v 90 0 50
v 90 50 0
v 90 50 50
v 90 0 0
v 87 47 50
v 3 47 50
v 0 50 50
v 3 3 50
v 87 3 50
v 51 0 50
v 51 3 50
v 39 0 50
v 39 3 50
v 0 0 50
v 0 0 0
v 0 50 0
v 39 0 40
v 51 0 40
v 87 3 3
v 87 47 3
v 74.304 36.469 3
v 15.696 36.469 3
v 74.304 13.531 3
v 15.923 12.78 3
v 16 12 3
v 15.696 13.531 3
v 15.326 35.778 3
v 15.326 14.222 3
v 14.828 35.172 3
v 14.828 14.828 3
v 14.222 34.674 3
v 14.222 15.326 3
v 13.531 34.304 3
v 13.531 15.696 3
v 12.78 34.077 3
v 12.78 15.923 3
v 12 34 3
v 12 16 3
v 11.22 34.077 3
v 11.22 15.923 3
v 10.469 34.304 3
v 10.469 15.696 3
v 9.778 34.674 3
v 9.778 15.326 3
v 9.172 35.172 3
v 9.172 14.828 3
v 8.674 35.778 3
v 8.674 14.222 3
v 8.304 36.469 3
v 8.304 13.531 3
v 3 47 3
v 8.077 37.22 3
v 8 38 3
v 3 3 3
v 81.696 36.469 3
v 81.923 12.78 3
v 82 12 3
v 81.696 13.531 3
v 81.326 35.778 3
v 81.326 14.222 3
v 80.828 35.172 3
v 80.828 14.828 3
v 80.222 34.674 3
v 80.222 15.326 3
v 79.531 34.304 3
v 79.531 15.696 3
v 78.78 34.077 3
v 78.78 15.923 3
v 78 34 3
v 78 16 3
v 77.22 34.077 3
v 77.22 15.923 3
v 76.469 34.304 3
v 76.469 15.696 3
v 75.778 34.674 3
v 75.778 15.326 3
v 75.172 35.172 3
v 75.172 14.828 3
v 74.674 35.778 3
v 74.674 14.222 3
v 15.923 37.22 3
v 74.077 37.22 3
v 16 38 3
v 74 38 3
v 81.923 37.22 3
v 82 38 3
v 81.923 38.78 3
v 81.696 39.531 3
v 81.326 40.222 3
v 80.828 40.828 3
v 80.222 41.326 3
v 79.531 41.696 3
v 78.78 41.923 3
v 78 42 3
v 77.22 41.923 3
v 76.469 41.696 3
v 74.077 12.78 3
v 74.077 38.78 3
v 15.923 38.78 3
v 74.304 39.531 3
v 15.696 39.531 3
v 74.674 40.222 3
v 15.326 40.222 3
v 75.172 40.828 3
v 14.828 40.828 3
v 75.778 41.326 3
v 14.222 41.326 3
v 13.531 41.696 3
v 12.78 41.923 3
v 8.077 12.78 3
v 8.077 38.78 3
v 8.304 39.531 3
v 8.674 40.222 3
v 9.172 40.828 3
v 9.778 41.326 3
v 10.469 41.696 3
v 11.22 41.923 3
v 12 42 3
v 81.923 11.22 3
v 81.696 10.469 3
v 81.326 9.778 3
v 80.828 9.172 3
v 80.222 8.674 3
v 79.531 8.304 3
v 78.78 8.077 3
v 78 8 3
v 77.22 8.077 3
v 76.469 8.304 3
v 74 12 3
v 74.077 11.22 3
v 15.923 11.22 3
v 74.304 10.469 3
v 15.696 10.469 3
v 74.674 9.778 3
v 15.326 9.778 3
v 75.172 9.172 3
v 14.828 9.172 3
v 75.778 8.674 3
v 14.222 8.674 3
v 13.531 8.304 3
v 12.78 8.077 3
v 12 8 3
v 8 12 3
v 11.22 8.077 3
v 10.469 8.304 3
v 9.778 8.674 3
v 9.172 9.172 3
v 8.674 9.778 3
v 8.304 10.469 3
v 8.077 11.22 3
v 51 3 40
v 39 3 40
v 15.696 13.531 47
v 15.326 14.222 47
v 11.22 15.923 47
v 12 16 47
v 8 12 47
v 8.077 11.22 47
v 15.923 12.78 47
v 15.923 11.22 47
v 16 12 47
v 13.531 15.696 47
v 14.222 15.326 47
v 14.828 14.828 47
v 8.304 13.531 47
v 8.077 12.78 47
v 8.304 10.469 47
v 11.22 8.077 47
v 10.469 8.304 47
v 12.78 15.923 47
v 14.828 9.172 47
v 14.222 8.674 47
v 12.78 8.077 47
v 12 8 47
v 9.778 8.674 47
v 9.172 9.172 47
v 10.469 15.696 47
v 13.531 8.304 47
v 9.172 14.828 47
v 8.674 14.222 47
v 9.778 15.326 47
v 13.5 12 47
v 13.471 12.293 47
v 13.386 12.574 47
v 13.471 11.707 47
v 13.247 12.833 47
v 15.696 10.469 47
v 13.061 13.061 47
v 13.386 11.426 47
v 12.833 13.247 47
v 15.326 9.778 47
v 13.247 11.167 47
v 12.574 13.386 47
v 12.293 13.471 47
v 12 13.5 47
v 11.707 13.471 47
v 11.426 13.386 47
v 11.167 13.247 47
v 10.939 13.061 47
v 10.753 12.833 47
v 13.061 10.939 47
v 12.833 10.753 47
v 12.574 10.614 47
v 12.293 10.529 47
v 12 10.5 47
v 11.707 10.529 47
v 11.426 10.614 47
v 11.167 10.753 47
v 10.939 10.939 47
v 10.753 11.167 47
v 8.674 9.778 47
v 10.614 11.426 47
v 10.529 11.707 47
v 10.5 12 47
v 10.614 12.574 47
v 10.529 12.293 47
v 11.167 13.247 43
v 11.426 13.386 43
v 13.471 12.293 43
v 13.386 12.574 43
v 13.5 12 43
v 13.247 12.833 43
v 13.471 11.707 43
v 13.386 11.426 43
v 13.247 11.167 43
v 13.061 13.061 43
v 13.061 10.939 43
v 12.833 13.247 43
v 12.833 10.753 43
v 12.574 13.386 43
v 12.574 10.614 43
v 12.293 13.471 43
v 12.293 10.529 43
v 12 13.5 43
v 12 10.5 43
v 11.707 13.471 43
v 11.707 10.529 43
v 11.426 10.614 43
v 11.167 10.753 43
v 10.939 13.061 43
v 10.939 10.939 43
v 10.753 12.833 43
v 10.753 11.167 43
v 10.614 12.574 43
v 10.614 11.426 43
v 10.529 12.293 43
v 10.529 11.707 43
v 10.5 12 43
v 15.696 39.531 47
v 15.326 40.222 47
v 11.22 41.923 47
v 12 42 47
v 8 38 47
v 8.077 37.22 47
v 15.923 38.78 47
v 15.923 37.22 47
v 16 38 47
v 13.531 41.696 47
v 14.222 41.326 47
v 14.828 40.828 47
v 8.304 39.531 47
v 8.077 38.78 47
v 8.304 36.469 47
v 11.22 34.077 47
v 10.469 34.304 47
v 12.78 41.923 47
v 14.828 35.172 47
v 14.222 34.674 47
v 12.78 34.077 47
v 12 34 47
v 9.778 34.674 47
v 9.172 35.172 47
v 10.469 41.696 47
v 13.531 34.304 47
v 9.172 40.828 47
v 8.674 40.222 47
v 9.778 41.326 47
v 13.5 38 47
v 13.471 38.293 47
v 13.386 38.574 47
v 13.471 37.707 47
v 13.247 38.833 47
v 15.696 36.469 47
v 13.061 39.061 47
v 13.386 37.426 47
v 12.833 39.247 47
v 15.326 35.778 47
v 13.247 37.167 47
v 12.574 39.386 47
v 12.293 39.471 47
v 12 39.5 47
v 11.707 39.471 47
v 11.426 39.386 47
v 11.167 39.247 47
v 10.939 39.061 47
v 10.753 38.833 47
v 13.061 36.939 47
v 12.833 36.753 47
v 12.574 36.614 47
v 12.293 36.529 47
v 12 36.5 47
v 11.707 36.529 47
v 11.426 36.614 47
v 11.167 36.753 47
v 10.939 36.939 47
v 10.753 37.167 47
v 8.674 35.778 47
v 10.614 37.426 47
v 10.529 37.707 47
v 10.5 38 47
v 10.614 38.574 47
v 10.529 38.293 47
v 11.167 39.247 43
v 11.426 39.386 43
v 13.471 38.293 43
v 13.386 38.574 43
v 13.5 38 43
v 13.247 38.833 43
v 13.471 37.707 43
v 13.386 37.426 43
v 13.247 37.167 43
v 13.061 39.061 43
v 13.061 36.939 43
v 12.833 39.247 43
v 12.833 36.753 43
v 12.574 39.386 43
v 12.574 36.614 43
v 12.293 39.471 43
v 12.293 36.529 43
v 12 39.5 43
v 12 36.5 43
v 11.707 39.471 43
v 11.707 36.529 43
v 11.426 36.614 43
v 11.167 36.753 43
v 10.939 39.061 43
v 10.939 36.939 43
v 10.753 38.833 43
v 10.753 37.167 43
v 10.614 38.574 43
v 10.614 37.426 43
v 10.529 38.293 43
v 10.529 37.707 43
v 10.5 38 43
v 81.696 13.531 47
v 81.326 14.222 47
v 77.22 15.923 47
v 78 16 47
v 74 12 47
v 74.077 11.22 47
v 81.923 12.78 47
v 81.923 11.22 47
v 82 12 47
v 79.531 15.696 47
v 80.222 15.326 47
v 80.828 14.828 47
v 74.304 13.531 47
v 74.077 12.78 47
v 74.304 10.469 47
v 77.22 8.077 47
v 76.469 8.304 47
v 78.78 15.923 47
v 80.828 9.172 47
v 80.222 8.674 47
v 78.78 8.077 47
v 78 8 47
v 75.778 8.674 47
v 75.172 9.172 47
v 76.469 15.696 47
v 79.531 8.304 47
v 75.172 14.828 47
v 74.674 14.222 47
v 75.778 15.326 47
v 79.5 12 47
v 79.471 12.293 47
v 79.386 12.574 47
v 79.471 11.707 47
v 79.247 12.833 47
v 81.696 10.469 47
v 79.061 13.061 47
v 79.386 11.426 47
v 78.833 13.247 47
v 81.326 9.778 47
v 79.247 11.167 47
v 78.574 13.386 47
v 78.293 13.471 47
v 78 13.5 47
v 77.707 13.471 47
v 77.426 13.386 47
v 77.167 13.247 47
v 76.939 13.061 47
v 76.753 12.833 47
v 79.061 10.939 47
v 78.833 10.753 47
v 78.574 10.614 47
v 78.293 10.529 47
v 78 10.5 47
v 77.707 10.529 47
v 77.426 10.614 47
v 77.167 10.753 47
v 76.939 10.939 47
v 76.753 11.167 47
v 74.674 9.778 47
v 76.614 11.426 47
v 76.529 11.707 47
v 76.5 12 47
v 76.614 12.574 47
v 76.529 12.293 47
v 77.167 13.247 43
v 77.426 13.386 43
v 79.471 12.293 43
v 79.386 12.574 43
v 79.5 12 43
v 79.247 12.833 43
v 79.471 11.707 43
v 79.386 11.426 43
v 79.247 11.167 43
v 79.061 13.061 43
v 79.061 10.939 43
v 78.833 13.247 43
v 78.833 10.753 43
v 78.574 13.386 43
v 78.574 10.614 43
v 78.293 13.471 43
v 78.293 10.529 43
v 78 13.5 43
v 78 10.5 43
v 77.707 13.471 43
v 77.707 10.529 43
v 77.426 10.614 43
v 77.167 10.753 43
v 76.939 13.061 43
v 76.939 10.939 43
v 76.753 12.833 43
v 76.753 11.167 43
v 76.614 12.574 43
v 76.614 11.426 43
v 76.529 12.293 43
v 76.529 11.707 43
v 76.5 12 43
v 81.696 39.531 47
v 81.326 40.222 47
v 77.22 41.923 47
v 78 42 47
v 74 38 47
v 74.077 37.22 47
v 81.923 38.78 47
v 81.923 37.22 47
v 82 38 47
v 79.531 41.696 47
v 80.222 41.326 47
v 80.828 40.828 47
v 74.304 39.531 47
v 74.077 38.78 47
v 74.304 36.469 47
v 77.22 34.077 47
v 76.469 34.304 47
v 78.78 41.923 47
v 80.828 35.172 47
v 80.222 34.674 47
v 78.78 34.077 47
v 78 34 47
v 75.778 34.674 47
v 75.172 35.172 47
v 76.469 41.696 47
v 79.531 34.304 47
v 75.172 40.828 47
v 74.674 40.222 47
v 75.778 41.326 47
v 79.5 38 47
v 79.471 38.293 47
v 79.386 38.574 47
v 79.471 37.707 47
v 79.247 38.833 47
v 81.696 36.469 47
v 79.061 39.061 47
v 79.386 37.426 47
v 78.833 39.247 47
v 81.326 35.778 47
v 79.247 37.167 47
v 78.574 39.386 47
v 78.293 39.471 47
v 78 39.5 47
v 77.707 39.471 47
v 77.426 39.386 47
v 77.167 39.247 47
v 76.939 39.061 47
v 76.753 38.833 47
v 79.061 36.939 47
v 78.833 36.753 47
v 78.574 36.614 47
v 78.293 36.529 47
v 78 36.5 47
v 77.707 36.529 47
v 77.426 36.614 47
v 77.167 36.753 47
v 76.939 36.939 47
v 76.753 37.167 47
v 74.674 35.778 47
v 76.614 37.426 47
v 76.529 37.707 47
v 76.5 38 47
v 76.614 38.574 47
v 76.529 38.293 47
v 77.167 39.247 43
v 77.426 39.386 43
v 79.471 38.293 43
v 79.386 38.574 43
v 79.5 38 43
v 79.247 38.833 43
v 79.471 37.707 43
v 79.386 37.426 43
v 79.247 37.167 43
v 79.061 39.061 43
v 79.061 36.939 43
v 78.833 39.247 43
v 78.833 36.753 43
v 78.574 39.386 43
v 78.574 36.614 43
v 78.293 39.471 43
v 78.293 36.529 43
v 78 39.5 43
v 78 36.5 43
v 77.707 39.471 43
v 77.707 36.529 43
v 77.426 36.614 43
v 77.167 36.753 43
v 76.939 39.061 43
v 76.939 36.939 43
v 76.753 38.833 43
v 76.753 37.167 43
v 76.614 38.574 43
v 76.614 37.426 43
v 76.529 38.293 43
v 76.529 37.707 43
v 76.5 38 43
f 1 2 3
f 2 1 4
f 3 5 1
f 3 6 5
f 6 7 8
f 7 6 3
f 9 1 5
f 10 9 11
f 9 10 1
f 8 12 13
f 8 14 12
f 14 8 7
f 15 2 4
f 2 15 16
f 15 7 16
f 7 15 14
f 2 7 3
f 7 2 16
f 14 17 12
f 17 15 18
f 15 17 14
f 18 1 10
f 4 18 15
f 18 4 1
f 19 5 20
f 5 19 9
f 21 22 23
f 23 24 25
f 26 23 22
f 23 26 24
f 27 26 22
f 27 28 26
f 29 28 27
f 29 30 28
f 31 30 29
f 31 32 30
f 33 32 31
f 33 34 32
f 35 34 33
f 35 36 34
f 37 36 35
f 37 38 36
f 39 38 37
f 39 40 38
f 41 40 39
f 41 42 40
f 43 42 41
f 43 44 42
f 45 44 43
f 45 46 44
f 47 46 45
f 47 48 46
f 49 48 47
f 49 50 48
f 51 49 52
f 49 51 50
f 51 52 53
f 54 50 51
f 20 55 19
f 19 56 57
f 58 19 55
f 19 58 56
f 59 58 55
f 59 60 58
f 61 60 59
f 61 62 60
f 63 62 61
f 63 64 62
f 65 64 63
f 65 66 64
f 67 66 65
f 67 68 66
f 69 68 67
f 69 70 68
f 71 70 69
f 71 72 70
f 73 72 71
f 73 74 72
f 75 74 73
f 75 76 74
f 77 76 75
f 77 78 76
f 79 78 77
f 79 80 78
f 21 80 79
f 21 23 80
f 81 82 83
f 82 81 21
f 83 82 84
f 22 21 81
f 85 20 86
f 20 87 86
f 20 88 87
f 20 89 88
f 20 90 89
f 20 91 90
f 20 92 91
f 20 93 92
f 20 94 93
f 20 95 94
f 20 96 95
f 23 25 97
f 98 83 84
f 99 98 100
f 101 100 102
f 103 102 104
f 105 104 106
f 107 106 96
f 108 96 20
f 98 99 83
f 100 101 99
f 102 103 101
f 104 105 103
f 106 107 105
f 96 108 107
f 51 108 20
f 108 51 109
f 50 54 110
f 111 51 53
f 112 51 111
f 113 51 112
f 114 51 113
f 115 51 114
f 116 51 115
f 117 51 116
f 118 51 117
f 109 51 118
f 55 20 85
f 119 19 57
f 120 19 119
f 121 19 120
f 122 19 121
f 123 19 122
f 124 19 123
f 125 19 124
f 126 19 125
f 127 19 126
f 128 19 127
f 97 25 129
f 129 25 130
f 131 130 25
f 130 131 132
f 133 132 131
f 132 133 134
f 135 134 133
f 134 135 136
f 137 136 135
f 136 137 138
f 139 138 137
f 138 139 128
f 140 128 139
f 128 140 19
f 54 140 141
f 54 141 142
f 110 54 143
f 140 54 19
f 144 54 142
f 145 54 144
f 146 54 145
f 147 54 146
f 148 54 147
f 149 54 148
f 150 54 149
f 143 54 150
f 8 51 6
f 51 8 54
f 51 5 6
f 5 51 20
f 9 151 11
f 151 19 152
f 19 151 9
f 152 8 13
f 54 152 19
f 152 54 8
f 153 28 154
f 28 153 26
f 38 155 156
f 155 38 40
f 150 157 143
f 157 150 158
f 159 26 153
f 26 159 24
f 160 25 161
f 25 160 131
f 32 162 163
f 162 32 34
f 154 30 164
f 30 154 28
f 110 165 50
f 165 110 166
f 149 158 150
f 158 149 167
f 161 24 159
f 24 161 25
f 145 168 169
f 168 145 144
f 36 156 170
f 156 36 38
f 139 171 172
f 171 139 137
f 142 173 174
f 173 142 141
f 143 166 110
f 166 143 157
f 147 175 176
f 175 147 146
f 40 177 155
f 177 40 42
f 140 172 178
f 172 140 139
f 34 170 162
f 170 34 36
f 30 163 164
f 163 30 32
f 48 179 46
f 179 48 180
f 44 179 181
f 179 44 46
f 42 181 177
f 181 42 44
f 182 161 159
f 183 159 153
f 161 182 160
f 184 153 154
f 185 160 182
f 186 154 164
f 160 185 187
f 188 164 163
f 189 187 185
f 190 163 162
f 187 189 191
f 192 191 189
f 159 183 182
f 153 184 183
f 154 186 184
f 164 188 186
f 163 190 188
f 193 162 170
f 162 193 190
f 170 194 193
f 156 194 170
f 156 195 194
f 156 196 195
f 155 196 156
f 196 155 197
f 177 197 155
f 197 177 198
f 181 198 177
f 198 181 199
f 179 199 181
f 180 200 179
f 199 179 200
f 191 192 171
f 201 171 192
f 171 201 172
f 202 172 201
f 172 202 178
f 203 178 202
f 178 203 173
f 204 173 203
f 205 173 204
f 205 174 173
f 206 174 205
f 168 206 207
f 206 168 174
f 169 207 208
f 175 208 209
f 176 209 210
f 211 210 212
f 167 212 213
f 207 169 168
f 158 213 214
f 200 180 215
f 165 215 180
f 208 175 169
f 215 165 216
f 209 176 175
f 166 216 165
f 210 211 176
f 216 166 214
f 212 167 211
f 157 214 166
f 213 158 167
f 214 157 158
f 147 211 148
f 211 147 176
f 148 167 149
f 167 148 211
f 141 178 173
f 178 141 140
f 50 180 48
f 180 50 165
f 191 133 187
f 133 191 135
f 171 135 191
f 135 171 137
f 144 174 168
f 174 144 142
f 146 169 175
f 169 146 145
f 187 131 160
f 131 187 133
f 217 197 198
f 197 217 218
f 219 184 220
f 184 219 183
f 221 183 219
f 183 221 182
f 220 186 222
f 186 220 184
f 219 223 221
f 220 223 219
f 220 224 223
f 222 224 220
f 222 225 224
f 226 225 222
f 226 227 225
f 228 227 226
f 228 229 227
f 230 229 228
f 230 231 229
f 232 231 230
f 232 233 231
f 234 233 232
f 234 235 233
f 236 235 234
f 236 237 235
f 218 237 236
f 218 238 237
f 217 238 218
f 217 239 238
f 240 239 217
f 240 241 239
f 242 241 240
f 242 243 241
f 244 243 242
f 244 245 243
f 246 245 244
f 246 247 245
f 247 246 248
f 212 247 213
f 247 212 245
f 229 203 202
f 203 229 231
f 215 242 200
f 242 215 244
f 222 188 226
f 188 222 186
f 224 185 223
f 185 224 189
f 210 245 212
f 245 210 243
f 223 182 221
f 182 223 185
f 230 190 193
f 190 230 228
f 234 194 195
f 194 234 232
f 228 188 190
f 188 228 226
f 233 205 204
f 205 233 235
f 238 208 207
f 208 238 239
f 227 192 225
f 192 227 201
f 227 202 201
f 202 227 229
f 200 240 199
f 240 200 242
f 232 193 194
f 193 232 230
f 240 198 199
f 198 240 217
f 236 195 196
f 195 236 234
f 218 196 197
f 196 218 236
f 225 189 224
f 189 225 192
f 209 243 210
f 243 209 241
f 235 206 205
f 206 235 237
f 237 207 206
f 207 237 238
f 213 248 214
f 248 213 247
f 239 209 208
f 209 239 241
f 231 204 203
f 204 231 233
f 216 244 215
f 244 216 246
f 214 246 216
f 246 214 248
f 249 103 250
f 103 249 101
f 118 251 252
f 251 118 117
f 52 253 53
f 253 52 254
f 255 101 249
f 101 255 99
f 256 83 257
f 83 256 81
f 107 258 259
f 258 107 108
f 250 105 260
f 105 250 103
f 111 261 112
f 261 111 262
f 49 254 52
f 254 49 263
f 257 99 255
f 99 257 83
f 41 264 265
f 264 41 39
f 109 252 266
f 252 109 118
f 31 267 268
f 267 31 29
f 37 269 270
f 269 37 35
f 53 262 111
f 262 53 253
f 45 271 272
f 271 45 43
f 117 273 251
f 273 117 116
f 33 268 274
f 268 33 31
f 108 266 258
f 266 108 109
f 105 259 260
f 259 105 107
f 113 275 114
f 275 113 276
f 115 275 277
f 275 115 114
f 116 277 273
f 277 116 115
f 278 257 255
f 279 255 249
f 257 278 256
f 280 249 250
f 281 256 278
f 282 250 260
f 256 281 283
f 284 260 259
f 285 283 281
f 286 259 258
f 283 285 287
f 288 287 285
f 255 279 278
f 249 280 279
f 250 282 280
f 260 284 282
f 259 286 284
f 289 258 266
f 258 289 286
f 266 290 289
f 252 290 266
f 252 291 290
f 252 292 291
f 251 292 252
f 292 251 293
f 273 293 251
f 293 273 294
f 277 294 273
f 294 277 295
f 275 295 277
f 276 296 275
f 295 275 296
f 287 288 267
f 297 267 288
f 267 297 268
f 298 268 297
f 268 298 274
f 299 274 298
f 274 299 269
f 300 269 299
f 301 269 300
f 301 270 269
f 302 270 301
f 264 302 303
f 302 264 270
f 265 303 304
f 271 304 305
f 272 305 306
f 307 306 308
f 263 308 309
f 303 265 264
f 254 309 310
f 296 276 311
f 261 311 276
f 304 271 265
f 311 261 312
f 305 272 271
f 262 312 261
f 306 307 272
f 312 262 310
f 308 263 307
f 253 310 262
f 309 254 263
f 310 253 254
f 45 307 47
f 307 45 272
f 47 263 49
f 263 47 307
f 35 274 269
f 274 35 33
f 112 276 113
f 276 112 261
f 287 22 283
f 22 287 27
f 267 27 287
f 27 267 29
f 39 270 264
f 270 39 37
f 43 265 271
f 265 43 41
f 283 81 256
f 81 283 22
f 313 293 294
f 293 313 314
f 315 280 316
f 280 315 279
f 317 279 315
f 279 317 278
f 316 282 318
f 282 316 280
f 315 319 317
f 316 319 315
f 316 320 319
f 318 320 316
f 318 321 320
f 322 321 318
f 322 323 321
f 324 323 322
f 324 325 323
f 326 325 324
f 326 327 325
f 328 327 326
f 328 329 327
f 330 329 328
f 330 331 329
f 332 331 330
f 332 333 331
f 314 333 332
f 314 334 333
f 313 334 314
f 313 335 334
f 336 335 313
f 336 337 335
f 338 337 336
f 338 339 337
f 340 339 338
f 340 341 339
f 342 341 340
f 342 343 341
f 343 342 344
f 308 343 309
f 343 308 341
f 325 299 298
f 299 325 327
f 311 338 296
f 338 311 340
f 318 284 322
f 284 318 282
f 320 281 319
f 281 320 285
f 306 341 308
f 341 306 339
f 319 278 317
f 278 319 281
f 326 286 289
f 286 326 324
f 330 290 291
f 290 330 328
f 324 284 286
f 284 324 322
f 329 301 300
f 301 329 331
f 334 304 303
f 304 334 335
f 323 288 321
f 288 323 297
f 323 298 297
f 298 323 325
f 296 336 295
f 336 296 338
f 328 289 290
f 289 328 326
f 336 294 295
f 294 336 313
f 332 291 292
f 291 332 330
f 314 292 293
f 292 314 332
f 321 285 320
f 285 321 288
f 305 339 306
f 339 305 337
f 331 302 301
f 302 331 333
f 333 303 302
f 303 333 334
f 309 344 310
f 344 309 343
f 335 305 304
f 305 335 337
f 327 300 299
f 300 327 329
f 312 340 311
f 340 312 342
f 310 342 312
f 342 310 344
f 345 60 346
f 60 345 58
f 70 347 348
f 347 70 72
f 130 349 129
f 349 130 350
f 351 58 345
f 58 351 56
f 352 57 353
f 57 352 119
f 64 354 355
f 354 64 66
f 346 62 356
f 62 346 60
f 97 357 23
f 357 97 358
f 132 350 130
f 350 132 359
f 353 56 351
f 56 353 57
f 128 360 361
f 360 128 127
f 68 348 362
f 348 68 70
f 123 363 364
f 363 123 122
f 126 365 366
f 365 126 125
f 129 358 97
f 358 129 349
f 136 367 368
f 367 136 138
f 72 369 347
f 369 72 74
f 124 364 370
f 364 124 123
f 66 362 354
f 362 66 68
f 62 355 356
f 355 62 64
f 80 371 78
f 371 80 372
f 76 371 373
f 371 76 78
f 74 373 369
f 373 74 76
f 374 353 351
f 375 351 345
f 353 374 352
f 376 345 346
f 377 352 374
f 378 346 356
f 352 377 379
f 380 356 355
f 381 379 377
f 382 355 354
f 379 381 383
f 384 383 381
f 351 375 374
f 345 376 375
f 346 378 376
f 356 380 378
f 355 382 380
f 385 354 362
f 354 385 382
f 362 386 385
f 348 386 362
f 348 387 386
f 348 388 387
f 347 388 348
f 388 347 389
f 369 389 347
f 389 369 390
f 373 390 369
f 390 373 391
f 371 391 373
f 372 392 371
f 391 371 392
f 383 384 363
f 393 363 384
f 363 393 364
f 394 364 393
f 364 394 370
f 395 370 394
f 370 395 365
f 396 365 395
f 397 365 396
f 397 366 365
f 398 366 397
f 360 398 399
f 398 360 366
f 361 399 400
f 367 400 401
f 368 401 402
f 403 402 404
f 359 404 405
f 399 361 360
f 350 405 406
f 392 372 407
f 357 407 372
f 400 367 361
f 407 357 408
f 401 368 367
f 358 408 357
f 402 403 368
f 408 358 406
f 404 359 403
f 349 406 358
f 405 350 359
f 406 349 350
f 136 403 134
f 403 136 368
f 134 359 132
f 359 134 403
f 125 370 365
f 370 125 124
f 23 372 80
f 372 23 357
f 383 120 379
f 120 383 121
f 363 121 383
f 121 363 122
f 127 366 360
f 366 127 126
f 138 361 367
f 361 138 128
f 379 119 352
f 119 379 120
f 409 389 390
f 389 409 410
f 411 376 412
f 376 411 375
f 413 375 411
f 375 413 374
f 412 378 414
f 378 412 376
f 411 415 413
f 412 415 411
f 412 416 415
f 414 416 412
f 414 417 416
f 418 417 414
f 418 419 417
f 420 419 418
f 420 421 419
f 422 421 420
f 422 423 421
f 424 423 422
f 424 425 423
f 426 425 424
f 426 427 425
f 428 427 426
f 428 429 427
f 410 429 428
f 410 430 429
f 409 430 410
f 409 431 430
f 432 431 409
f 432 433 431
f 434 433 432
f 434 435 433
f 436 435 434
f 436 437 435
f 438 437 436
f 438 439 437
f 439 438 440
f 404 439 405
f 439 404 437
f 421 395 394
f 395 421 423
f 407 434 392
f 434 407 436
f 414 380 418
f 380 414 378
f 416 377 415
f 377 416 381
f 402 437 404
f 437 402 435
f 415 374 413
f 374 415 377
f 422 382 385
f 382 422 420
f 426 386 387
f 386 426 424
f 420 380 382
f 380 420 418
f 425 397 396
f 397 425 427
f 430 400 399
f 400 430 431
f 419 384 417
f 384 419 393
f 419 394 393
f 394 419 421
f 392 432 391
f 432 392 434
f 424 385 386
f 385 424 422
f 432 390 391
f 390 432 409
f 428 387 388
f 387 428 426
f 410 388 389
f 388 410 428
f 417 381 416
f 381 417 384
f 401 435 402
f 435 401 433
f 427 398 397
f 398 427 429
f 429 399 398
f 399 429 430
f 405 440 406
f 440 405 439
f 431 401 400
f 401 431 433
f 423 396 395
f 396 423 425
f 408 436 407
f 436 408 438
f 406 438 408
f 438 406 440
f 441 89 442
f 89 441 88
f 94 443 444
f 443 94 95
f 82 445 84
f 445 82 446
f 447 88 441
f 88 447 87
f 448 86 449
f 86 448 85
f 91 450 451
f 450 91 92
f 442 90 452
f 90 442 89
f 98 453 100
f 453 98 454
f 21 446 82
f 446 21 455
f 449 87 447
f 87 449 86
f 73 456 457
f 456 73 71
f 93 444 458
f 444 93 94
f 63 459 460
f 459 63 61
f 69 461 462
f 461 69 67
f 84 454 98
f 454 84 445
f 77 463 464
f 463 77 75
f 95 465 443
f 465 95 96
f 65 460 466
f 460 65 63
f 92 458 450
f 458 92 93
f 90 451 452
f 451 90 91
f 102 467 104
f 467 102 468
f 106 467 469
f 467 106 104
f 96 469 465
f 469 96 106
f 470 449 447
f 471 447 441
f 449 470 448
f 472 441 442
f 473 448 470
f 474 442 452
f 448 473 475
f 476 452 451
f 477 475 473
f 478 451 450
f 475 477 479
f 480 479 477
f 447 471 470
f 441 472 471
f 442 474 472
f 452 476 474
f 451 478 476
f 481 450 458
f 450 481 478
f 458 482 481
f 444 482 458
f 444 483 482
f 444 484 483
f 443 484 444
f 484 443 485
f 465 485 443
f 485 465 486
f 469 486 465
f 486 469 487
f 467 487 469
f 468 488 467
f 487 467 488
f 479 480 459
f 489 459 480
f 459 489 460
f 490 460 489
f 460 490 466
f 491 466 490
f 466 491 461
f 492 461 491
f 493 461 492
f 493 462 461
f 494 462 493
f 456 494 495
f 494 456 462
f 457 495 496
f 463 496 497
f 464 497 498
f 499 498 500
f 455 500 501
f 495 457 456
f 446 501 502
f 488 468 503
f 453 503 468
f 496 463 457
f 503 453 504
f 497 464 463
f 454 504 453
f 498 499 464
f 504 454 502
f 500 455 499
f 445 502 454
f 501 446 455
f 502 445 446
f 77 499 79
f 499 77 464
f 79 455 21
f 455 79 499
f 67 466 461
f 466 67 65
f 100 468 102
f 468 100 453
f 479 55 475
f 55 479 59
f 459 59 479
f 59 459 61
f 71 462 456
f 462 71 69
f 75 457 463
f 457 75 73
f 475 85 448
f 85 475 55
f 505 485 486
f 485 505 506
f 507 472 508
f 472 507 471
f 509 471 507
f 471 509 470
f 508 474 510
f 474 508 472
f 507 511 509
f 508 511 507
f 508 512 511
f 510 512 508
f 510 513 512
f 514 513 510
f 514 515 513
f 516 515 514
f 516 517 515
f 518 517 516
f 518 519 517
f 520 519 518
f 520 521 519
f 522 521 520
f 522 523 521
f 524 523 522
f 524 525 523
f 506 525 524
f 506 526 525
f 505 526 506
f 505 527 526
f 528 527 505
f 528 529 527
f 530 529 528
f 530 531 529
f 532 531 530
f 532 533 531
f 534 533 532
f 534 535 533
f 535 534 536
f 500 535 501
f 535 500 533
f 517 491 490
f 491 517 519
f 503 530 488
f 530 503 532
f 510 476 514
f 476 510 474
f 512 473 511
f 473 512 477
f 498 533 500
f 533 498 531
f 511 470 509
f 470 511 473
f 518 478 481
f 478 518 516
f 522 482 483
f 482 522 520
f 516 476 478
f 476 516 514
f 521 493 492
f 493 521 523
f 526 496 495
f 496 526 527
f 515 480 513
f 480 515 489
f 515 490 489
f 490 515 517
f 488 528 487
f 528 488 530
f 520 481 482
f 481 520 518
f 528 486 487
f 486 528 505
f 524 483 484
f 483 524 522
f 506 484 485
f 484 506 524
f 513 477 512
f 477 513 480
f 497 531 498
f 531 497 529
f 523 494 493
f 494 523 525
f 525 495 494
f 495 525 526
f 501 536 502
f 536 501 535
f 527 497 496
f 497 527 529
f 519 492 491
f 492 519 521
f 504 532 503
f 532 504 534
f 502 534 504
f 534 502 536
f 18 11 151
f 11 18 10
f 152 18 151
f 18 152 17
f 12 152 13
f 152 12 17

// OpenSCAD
$fn = 32;

// ----------------------------------------------------------------------
// Enclosure box: both enclosure
// ----------------------------------------------------------------------

// --- parameters (mm) ---
box_l = 90;               // outer length, X
box_w = 50;               // outer width, Y
box_h = 50;               // outer height
wall_t = 3;               // wall thickness
boss_r = 4;               // corner boss radius
hole_r = 1.5;             // boss screw hole radius
boss_in = 12;             // boss inset from the corners
notch_w = 12;             // cable notch width
notch_h = 10;             // cable notch height

inner_h = box_h - wall_t;  // cavity depth
boss_h = inner_h - 2;  // corner boss height

difference() {
  union() {
    difference() {
      cube([box_l, box_w, box_h]);
      translate([wall_t, wall_t, wall_t])
        cube([box_l - 2 * wall_t, box_w - 2 * wall_t, box_h]);
    }
    for (sx = [0, 1], sy = [0, 1])
      translate([sx ? box_l - boss_in : boss_in,
                 sy ? box_w - boss_in : boss_in, wall_t - 1])
        difference() {
          cylinder(r = boss_r, h = boss_h);
          translate([0, 0, boss_h - 4])
            cylinder(r = hole_r, h = 5);
        }
  }
  translate([box_l / 2 - notch_w / 2, -1, box_h - notch_h])
    cube([notch_w, wall_t + 2, notch_h + 1]);
}
